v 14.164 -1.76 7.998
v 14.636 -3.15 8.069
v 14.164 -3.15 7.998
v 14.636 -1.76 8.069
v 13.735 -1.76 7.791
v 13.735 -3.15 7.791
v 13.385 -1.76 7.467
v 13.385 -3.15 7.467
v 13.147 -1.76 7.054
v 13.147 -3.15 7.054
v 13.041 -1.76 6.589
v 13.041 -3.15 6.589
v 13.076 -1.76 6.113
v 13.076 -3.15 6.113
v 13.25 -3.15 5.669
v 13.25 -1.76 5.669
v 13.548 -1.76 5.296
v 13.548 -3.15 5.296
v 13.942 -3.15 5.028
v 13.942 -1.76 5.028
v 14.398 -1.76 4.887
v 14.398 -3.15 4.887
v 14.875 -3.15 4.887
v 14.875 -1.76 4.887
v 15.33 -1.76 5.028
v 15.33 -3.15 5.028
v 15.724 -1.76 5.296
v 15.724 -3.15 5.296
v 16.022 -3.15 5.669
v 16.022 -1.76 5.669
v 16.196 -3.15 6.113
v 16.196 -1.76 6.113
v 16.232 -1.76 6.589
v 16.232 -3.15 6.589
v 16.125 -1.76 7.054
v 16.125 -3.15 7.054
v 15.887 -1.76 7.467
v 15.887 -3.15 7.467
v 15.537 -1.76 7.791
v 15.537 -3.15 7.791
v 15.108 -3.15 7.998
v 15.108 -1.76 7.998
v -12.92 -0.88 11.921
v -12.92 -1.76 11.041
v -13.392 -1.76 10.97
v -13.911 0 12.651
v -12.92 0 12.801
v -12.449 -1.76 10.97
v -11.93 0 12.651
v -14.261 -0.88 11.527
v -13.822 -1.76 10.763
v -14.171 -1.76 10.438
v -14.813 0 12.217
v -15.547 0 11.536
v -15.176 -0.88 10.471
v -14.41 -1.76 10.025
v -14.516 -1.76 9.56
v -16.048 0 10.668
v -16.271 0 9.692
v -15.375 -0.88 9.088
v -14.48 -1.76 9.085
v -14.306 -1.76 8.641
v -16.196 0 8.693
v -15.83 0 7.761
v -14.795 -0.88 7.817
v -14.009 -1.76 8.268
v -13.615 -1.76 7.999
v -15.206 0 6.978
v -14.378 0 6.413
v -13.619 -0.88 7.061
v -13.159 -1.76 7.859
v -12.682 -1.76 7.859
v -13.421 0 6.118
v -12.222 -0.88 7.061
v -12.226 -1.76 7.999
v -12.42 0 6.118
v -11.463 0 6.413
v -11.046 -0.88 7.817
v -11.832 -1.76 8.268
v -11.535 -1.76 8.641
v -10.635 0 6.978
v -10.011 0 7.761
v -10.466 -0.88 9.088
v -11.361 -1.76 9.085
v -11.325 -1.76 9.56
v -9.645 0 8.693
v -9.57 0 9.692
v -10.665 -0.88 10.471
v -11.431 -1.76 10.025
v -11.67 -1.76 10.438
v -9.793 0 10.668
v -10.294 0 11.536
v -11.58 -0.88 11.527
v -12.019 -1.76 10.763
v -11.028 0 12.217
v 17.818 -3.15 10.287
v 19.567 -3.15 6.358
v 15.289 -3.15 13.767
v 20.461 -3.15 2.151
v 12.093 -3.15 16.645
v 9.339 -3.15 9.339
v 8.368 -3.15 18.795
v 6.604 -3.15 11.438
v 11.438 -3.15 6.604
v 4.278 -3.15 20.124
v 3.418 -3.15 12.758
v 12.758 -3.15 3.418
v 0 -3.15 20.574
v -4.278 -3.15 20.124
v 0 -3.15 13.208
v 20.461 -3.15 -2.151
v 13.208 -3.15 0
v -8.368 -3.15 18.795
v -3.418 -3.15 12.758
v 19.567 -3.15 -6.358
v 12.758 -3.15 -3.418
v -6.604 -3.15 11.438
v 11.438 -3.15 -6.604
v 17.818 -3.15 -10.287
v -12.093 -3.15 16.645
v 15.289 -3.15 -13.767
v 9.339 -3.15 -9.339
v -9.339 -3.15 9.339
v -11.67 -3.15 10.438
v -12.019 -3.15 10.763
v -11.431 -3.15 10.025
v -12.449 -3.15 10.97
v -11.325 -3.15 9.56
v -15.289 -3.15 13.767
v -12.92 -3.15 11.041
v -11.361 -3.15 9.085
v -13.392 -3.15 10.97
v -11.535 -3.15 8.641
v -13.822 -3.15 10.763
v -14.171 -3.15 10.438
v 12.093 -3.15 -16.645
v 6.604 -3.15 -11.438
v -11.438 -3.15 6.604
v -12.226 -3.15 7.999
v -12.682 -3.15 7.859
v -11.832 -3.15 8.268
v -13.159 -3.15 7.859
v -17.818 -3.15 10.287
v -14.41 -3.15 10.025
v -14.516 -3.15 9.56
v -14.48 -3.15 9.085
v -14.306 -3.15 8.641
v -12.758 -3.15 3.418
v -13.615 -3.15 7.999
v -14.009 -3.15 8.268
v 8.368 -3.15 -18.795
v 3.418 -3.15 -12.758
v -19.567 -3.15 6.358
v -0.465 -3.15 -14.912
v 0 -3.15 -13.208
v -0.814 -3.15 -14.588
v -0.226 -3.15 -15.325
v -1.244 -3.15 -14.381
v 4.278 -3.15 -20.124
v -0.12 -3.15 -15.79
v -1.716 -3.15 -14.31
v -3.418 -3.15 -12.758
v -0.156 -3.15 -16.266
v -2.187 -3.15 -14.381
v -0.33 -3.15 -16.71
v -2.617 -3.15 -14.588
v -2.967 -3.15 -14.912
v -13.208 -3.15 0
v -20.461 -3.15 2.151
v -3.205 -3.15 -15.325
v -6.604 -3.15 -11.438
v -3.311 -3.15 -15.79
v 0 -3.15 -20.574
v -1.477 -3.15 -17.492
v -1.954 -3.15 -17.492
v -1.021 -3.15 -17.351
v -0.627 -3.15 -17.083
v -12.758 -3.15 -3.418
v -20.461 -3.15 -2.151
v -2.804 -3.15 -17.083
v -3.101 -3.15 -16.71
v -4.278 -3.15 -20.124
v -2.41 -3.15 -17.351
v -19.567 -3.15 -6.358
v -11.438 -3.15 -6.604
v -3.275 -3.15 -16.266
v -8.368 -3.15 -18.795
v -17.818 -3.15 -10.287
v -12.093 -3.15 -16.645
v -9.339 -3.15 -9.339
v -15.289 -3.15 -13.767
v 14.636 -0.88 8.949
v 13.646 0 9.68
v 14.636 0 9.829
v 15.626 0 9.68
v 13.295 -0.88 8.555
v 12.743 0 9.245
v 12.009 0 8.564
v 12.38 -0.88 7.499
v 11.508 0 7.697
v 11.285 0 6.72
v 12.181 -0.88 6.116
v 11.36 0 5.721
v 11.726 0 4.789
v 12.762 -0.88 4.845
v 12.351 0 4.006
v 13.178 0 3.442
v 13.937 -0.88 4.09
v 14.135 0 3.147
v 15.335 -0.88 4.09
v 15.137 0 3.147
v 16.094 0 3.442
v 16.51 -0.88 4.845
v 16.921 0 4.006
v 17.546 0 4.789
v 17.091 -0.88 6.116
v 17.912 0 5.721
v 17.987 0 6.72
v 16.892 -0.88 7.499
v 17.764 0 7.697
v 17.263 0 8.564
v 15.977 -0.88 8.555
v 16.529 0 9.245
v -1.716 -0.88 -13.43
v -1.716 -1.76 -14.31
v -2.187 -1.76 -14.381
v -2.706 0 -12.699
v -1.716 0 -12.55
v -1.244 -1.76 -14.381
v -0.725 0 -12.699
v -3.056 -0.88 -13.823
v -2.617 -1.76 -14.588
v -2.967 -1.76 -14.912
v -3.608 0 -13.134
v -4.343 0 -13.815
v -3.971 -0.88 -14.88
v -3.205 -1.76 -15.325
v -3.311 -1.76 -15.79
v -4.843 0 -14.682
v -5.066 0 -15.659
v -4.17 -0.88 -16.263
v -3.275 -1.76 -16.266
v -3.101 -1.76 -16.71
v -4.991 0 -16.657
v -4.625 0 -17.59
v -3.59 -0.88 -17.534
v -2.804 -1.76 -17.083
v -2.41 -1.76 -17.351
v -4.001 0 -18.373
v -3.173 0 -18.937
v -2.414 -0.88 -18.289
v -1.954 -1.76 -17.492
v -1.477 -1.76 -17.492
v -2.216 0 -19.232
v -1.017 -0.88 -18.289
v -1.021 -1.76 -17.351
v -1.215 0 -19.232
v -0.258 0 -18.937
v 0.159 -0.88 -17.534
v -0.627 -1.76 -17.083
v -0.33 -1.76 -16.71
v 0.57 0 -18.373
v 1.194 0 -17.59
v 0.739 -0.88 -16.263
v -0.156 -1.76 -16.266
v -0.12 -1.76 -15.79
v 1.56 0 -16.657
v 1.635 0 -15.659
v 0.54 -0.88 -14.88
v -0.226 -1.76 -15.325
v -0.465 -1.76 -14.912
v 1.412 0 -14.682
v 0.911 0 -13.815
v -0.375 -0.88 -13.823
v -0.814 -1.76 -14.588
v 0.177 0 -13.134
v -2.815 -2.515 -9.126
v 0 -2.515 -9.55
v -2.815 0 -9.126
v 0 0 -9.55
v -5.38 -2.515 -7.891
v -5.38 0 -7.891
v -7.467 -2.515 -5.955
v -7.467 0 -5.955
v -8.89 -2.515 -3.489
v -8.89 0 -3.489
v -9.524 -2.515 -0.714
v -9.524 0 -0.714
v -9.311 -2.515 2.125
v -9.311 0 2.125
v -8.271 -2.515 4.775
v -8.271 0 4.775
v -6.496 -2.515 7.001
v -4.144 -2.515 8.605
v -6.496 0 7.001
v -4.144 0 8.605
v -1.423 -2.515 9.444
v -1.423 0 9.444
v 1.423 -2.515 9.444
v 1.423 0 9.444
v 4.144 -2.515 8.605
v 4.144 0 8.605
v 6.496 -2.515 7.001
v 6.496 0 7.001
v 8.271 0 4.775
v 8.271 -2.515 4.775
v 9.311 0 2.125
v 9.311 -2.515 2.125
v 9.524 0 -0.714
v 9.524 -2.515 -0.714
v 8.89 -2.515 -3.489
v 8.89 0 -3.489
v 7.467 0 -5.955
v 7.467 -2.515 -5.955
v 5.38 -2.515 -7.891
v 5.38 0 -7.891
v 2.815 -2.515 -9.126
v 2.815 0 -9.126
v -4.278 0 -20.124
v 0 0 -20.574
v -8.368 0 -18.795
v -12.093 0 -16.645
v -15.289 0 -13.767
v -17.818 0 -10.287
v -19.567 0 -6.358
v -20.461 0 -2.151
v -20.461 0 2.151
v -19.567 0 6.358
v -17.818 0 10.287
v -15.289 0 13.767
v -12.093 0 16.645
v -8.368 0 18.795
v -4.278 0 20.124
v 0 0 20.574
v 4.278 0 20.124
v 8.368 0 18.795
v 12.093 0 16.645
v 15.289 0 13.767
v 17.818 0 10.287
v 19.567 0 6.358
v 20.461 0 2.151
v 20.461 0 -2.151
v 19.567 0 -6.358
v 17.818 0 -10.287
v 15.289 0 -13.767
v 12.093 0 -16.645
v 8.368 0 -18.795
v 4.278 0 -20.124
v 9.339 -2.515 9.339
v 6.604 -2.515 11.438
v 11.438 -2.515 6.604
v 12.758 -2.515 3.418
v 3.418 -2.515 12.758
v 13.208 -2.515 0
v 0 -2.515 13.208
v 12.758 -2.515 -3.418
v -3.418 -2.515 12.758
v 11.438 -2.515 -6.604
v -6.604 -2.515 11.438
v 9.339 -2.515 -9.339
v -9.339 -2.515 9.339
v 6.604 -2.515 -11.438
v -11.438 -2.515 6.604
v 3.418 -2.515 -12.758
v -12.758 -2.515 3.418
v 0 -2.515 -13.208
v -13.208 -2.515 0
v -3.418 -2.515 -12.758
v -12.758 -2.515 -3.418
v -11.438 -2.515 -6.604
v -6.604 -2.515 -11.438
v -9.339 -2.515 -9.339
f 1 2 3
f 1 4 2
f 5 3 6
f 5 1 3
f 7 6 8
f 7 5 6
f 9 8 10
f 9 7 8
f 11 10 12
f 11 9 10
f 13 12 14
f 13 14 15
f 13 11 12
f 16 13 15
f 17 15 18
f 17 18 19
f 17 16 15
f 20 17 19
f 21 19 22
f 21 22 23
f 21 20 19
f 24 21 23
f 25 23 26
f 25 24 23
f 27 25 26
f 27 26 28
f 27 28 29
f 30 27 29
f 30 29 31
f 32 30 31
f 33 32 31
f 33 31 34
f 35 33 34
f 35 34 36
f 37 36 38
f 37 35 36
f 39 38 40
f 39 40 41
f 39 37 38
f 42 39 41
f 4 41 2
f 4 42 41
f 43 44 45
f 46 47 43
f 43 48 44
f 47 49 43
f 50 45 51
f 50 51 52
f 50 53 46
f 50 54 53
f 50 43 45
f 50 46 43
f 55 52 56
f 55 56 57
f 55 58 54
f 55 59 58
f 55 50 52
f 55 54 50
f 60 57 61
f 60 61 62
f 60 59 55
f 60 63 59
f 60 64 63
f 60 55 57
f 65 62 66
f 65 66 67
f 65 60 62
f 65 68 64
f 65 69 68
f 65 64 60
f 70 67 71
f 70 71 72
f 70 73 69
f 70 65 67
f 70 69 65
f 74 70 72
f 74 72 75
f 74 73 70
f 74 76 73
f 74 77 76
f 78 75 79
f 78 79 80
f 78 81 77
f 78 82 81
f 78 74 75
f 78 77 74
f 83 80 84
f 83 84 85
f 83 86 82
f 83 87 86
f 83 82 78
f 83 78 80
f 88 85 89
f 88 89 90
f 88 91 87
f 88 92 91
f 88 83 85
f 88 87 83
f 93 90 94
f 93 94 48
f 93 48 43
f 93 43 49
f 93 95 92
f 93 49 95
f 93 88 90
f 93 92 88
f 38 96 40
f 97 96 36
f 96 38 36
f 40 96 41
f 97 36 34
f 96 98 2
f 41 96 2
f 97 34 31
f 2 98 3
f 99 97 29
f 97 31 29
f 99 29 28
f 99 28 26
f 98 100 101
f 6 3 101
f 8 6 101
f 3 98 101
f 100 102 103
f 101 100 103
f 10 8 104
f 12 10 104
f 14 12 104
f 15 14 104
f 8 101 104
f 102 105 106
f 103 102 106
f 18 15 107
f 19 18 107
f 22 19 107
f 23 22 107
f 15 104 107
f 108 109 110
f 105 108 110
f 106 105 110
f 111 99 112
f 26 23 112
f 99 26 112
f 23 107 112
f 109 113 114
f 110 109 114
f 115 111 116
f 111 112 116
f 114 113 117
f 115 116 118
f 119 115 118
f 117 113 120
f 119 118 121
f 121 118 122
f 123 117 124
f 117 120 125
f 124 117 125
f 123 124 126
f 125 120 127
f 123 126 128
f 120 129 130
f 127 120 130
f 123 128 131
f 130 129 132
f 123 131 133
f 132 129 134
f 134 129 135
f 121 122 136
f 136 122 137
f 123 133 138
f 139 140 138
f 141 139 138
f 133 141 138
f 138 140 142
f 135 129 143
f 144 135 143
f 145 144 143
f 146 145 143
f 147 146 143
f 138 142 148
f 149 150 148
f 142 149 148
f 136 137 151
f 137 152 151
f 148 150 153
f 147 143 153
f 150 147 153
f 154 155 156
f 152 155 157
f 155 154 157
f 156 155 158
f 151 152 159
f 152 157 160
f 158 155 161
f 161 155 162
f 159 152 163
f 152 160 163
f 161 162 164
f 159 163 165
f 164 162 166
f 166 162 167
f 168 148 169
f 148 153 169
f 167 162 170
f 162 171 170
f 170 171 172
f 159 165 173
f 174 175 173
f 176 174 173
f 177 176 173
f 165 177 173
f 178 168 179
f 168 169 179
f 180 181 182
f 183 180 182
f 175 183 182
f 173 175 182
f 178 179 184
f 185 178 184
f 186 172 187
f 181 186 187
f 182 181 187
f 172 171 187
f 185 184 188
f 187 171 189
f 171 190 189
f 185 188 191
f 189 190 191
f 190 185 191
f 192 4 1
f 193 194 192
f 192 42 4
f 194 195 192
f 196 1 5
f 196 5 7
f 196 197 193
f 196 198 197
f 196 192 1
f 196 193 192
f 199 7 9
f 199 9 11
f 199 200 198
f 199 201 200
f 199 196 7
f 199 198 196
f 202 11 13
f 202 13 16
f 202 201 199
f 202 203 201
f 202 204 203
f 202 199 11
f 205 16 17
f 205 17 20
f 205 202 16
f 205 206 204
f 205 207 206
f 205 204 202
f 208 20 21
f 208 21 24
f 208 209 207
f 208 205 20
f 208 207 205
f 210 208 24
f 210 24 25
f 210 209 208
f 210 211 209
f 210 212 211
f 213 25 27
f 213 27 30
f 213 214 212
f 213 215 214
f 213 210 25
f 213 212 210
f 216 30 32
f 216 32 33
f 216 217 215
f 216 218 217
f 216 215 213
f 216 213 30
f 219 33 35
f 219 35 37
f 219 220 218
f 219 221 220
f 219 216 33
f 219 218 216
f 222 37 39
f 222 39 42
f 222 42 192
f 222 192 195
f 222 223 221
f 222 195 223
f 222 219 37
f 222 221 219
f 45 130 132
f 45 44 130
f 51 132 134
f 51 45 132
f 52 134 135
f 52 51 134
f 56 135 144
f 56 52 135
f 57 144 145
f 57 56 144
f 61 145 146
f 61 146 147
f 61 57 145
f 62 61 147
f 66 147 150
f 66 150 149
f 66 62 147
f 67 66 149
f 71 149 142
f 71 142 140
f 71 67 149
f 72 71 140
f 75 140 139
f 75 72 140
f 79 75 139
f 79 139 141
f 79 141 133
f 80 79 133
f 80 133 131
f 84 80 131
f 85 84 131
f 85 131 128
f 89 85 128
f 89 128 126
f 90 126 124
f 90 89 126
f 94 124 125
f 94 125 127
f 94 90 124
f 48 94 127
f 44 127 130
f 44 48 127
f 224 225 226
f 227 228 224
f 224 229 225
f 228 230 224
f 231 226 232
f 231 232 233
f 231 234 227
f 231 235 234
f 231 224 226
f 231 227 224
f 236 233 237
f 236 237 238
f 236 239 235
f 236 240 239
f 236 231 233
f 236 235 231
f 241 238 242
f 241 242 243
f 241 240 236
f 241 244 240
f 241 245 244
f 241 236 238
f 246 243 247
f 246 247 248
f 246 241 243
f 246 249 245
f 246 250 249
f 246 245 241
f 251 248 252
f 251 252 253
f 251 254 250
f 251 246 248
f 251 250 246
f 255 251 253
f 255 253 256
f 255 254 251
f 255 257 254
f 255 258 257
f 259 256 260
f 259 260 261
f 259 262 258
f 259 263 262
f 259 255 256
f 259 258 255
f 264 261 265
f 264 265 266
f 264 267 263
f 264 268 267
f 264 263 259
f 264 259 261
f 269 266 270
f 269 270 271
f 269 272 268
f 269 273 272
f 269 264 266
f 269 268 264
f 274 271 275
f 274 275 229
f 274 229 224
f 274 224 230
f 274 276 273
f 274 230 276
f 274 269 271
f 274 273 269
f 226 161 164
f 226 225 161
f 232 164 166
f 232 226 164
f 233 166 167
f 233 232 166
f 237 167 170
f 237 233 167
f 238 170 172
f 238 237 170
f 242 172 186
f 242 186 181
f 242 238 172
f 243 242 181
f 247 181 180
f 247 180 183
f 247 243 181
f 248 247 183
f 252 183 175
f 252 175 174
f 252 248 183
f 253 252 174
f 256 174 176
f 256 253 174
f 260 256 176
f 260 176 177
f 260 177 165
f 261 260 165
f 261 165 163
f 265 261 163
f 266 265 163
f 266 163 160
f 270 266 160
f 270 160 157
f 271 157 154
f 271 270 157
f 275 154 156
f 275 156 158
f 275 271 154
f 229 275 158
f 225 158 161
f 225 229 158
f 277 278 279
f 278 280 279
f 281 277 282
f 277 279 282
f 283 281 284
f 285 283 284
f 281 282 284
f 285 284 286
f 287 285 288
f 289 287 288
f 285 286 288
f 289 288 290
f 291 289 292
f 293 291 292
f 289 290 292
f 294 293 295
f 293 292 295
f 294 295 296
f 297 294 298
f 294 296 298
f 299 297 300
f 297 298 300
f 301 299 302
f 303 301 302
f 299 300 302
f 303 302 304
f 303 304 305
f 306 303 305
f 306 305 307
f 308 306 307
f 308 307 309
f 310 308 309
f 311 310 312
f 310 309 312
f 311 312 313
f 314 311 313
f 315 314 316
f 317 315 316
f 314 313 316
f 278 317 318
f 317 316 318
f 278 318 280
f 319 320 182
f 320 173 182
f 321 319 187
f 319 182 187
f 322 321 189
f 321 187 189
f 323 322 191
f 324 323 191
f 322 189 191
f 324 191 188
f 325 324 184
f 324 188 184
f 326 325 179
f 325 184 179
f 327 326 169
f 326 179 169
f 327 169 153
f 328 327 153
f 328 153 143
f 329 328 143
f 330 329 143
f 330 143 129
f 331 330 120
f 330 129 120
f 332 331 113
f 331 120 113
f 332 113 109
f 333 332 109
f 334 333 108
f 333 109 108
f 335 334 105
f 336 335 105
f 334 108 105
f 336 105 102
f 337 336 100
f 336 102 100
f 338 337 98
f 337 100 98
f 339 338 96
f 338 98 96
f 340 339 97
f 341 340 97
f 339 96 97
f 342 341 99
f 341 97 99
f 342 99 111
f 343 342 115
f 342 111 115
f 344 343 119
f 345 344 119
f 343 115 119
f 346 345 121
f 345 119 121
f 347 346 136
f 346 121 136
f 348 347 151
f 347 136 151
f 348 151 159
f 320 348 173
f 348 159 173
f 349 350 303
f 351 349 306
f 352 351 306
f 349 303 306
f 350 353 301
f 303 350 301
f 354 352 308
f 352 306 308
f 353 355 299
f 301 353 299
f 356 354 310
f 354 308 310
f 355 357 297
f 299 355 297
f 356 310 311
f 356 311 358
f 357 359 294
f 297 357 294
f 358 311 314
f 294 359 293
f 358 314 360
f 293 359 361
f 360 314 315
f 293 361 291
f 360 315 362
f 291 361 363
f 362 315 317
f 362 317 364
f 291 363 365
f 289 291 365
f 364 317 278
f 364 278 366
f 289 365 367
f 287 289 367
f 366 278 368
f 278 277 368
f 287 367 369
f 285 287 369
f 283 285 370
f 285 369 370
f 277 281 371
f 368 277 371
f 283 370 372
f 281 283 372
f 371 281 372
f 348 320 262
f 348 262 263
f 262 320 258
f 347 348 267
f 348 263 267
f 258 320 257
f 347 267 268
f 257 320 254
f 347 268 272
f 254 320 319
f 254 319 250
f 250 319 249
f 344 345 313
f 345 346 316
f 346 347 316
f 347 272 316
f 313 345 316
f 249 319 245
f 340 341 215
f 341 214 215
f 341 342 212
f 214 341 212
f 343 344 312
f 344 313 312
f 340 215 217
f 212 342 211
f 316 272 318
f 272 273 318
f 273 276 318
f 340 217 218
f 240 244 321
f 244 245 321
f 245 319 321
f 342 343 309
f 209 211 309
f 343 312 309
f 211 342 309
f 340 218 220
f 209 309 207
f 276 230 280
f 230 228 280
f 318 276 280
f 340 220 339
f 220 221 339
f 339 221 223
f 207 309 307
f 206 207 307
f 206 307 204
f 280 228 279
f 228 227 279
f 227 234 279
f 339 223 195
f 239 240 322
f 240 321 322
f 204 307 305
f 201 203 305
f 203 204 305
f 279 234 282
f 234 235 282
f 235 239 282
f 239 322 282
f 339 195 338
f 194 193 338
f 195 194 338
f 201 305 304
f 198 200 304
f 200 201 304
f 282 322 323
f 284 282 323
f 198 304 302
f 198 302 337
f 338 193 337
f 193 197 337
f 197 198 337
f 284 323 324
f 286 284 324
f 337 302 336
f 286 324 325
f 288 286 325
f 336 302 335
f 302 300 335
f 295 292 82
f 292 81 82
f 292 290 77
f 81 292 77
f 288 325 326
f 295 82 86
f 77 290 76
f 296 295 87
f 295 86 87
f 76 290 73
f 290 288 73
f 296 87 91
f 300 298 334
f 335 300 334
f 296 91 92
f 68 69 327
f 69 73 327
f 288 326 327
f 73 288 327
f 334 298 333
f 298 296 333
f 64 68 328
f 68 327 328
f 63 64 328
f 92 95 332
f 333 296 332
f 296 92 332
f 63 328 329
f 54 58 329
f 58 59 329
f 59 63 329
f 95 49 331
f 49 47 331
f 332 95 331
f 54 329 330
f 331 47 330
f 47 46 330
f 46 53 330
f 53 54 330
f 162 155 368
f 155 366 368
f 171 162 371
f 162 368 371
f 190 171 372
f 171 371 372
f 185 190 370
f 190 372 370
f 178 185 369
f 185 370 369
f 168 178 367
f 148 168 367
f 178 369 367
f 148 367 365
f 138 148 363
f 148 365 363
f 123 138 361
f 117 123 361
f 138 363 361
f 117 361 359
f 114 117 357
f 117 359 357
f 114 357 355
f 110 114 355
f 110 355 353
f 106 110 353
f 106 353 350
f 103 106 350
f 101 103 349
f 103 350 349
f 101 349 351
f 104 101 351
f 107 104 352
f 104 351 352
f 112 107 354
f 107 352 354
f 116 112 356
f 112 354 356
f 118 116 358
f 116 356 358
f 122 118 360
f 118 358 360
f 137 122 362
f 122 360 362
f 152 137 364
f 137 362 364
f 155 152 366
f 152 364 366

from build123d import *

# Parameters (mm, degrees)
CSK_FOR_M3_SFHCS1_AT_2_COUNT = 2
CSK_FOR_M3_SFHCS1_AT_2_PITCH = 16.002
CSK_FOR_M3_SFHCS1_AT_3_COUNT = 2
CSK_FOR_M3_SFHCS1_AT_3_PITCH = 16.002
CSK_FOR_M3_SFHCS1_AT_4_COUNT = 2
CSK_FOR_M3_SFHCS1_AT_4_PITCH = 16.002


with BuildPart() as part:
    # Sketch1 → Revolve1 (revolve)
    with BuildSketch(Plane.XY, mode=Mode.PRIVATE) as revolve1_sk:
        Polygon((-9.5504, 0), (-20.574, 0), (-20.574, -3.1496), (-13.208, -3.1496), (-13.208, -2.5146), (-9.5504, -2.5146), align=None)
    revolve(revolve1_sk.sketch.rotate(Axis((0, 0, 0), (0, 1, 0)), 270), axis=Axis((0, 0, 0), (0, 1, 0)))

    # Sketch2 → CSK for M3 SFHCS1 (revolve, cut)
    with BuildSketch(Plane(origin=(0, 0, 0), x_dir=(0, 0, 1), z_dir=(1, 0, 0))):
        Polygon((0, 0), (0, 3.1496), (1.6, 3.1496), (1.6, 1.76), (3.36, 0), align=None)
    csk_for_m3_sfhcs1 = revolve(axis=Axis((0, 6.35, 0), (0, -1, 0)), mode=Mode.SUBTRACT)

    # CSK for M3 SFHCS1 at 2: CSK for M3 SFHCS1 ×2
    with Locations(*[Vector(-0.10721238743656843, 0, -0.9942361409545275) * (i * CSK_FOR_M3_SFHCS1_AT_2_PITCH) for i in range(1, CSK_FOR_M3_SFHCS1_AT_2_COUNT)]):
        add(csk_for_m3_sfhcs1, mode=Mode.SUBTRACT)

    # CSK for M3 SFHCS1 at 3: CSK for M3 SFHCS1 ×2
    with Locations(*[Vector(0.9146399491455367, 0, 0.4042694193567579) * (i * CSK_FOR_M3_SFHCS1_AT_3_PITCH) for i in range(1, CSK_FOR_M3_SFHCS1_AT_3_COUNT)]):
        add(csk_for_m3_sfhcs1, mode=Mode.SUBTRACT)

    # CSK for M3 SFHCS1 at 4: CSK for M3 SFHCS1 ×2
    with Locations(*[Vector(-0.8074275617089052, 0, 0.5899667215977628) * (i * CSK_FOR_M3_SFHCS1_AT_4_PITCH) for i in range(1, CSK_FOR_M3_SFHCS1_AT_4_COUNT)]):
        add(csk_for_m3_sfhcs1, mode=Mode.SUBTRACT)


solid = part.part
